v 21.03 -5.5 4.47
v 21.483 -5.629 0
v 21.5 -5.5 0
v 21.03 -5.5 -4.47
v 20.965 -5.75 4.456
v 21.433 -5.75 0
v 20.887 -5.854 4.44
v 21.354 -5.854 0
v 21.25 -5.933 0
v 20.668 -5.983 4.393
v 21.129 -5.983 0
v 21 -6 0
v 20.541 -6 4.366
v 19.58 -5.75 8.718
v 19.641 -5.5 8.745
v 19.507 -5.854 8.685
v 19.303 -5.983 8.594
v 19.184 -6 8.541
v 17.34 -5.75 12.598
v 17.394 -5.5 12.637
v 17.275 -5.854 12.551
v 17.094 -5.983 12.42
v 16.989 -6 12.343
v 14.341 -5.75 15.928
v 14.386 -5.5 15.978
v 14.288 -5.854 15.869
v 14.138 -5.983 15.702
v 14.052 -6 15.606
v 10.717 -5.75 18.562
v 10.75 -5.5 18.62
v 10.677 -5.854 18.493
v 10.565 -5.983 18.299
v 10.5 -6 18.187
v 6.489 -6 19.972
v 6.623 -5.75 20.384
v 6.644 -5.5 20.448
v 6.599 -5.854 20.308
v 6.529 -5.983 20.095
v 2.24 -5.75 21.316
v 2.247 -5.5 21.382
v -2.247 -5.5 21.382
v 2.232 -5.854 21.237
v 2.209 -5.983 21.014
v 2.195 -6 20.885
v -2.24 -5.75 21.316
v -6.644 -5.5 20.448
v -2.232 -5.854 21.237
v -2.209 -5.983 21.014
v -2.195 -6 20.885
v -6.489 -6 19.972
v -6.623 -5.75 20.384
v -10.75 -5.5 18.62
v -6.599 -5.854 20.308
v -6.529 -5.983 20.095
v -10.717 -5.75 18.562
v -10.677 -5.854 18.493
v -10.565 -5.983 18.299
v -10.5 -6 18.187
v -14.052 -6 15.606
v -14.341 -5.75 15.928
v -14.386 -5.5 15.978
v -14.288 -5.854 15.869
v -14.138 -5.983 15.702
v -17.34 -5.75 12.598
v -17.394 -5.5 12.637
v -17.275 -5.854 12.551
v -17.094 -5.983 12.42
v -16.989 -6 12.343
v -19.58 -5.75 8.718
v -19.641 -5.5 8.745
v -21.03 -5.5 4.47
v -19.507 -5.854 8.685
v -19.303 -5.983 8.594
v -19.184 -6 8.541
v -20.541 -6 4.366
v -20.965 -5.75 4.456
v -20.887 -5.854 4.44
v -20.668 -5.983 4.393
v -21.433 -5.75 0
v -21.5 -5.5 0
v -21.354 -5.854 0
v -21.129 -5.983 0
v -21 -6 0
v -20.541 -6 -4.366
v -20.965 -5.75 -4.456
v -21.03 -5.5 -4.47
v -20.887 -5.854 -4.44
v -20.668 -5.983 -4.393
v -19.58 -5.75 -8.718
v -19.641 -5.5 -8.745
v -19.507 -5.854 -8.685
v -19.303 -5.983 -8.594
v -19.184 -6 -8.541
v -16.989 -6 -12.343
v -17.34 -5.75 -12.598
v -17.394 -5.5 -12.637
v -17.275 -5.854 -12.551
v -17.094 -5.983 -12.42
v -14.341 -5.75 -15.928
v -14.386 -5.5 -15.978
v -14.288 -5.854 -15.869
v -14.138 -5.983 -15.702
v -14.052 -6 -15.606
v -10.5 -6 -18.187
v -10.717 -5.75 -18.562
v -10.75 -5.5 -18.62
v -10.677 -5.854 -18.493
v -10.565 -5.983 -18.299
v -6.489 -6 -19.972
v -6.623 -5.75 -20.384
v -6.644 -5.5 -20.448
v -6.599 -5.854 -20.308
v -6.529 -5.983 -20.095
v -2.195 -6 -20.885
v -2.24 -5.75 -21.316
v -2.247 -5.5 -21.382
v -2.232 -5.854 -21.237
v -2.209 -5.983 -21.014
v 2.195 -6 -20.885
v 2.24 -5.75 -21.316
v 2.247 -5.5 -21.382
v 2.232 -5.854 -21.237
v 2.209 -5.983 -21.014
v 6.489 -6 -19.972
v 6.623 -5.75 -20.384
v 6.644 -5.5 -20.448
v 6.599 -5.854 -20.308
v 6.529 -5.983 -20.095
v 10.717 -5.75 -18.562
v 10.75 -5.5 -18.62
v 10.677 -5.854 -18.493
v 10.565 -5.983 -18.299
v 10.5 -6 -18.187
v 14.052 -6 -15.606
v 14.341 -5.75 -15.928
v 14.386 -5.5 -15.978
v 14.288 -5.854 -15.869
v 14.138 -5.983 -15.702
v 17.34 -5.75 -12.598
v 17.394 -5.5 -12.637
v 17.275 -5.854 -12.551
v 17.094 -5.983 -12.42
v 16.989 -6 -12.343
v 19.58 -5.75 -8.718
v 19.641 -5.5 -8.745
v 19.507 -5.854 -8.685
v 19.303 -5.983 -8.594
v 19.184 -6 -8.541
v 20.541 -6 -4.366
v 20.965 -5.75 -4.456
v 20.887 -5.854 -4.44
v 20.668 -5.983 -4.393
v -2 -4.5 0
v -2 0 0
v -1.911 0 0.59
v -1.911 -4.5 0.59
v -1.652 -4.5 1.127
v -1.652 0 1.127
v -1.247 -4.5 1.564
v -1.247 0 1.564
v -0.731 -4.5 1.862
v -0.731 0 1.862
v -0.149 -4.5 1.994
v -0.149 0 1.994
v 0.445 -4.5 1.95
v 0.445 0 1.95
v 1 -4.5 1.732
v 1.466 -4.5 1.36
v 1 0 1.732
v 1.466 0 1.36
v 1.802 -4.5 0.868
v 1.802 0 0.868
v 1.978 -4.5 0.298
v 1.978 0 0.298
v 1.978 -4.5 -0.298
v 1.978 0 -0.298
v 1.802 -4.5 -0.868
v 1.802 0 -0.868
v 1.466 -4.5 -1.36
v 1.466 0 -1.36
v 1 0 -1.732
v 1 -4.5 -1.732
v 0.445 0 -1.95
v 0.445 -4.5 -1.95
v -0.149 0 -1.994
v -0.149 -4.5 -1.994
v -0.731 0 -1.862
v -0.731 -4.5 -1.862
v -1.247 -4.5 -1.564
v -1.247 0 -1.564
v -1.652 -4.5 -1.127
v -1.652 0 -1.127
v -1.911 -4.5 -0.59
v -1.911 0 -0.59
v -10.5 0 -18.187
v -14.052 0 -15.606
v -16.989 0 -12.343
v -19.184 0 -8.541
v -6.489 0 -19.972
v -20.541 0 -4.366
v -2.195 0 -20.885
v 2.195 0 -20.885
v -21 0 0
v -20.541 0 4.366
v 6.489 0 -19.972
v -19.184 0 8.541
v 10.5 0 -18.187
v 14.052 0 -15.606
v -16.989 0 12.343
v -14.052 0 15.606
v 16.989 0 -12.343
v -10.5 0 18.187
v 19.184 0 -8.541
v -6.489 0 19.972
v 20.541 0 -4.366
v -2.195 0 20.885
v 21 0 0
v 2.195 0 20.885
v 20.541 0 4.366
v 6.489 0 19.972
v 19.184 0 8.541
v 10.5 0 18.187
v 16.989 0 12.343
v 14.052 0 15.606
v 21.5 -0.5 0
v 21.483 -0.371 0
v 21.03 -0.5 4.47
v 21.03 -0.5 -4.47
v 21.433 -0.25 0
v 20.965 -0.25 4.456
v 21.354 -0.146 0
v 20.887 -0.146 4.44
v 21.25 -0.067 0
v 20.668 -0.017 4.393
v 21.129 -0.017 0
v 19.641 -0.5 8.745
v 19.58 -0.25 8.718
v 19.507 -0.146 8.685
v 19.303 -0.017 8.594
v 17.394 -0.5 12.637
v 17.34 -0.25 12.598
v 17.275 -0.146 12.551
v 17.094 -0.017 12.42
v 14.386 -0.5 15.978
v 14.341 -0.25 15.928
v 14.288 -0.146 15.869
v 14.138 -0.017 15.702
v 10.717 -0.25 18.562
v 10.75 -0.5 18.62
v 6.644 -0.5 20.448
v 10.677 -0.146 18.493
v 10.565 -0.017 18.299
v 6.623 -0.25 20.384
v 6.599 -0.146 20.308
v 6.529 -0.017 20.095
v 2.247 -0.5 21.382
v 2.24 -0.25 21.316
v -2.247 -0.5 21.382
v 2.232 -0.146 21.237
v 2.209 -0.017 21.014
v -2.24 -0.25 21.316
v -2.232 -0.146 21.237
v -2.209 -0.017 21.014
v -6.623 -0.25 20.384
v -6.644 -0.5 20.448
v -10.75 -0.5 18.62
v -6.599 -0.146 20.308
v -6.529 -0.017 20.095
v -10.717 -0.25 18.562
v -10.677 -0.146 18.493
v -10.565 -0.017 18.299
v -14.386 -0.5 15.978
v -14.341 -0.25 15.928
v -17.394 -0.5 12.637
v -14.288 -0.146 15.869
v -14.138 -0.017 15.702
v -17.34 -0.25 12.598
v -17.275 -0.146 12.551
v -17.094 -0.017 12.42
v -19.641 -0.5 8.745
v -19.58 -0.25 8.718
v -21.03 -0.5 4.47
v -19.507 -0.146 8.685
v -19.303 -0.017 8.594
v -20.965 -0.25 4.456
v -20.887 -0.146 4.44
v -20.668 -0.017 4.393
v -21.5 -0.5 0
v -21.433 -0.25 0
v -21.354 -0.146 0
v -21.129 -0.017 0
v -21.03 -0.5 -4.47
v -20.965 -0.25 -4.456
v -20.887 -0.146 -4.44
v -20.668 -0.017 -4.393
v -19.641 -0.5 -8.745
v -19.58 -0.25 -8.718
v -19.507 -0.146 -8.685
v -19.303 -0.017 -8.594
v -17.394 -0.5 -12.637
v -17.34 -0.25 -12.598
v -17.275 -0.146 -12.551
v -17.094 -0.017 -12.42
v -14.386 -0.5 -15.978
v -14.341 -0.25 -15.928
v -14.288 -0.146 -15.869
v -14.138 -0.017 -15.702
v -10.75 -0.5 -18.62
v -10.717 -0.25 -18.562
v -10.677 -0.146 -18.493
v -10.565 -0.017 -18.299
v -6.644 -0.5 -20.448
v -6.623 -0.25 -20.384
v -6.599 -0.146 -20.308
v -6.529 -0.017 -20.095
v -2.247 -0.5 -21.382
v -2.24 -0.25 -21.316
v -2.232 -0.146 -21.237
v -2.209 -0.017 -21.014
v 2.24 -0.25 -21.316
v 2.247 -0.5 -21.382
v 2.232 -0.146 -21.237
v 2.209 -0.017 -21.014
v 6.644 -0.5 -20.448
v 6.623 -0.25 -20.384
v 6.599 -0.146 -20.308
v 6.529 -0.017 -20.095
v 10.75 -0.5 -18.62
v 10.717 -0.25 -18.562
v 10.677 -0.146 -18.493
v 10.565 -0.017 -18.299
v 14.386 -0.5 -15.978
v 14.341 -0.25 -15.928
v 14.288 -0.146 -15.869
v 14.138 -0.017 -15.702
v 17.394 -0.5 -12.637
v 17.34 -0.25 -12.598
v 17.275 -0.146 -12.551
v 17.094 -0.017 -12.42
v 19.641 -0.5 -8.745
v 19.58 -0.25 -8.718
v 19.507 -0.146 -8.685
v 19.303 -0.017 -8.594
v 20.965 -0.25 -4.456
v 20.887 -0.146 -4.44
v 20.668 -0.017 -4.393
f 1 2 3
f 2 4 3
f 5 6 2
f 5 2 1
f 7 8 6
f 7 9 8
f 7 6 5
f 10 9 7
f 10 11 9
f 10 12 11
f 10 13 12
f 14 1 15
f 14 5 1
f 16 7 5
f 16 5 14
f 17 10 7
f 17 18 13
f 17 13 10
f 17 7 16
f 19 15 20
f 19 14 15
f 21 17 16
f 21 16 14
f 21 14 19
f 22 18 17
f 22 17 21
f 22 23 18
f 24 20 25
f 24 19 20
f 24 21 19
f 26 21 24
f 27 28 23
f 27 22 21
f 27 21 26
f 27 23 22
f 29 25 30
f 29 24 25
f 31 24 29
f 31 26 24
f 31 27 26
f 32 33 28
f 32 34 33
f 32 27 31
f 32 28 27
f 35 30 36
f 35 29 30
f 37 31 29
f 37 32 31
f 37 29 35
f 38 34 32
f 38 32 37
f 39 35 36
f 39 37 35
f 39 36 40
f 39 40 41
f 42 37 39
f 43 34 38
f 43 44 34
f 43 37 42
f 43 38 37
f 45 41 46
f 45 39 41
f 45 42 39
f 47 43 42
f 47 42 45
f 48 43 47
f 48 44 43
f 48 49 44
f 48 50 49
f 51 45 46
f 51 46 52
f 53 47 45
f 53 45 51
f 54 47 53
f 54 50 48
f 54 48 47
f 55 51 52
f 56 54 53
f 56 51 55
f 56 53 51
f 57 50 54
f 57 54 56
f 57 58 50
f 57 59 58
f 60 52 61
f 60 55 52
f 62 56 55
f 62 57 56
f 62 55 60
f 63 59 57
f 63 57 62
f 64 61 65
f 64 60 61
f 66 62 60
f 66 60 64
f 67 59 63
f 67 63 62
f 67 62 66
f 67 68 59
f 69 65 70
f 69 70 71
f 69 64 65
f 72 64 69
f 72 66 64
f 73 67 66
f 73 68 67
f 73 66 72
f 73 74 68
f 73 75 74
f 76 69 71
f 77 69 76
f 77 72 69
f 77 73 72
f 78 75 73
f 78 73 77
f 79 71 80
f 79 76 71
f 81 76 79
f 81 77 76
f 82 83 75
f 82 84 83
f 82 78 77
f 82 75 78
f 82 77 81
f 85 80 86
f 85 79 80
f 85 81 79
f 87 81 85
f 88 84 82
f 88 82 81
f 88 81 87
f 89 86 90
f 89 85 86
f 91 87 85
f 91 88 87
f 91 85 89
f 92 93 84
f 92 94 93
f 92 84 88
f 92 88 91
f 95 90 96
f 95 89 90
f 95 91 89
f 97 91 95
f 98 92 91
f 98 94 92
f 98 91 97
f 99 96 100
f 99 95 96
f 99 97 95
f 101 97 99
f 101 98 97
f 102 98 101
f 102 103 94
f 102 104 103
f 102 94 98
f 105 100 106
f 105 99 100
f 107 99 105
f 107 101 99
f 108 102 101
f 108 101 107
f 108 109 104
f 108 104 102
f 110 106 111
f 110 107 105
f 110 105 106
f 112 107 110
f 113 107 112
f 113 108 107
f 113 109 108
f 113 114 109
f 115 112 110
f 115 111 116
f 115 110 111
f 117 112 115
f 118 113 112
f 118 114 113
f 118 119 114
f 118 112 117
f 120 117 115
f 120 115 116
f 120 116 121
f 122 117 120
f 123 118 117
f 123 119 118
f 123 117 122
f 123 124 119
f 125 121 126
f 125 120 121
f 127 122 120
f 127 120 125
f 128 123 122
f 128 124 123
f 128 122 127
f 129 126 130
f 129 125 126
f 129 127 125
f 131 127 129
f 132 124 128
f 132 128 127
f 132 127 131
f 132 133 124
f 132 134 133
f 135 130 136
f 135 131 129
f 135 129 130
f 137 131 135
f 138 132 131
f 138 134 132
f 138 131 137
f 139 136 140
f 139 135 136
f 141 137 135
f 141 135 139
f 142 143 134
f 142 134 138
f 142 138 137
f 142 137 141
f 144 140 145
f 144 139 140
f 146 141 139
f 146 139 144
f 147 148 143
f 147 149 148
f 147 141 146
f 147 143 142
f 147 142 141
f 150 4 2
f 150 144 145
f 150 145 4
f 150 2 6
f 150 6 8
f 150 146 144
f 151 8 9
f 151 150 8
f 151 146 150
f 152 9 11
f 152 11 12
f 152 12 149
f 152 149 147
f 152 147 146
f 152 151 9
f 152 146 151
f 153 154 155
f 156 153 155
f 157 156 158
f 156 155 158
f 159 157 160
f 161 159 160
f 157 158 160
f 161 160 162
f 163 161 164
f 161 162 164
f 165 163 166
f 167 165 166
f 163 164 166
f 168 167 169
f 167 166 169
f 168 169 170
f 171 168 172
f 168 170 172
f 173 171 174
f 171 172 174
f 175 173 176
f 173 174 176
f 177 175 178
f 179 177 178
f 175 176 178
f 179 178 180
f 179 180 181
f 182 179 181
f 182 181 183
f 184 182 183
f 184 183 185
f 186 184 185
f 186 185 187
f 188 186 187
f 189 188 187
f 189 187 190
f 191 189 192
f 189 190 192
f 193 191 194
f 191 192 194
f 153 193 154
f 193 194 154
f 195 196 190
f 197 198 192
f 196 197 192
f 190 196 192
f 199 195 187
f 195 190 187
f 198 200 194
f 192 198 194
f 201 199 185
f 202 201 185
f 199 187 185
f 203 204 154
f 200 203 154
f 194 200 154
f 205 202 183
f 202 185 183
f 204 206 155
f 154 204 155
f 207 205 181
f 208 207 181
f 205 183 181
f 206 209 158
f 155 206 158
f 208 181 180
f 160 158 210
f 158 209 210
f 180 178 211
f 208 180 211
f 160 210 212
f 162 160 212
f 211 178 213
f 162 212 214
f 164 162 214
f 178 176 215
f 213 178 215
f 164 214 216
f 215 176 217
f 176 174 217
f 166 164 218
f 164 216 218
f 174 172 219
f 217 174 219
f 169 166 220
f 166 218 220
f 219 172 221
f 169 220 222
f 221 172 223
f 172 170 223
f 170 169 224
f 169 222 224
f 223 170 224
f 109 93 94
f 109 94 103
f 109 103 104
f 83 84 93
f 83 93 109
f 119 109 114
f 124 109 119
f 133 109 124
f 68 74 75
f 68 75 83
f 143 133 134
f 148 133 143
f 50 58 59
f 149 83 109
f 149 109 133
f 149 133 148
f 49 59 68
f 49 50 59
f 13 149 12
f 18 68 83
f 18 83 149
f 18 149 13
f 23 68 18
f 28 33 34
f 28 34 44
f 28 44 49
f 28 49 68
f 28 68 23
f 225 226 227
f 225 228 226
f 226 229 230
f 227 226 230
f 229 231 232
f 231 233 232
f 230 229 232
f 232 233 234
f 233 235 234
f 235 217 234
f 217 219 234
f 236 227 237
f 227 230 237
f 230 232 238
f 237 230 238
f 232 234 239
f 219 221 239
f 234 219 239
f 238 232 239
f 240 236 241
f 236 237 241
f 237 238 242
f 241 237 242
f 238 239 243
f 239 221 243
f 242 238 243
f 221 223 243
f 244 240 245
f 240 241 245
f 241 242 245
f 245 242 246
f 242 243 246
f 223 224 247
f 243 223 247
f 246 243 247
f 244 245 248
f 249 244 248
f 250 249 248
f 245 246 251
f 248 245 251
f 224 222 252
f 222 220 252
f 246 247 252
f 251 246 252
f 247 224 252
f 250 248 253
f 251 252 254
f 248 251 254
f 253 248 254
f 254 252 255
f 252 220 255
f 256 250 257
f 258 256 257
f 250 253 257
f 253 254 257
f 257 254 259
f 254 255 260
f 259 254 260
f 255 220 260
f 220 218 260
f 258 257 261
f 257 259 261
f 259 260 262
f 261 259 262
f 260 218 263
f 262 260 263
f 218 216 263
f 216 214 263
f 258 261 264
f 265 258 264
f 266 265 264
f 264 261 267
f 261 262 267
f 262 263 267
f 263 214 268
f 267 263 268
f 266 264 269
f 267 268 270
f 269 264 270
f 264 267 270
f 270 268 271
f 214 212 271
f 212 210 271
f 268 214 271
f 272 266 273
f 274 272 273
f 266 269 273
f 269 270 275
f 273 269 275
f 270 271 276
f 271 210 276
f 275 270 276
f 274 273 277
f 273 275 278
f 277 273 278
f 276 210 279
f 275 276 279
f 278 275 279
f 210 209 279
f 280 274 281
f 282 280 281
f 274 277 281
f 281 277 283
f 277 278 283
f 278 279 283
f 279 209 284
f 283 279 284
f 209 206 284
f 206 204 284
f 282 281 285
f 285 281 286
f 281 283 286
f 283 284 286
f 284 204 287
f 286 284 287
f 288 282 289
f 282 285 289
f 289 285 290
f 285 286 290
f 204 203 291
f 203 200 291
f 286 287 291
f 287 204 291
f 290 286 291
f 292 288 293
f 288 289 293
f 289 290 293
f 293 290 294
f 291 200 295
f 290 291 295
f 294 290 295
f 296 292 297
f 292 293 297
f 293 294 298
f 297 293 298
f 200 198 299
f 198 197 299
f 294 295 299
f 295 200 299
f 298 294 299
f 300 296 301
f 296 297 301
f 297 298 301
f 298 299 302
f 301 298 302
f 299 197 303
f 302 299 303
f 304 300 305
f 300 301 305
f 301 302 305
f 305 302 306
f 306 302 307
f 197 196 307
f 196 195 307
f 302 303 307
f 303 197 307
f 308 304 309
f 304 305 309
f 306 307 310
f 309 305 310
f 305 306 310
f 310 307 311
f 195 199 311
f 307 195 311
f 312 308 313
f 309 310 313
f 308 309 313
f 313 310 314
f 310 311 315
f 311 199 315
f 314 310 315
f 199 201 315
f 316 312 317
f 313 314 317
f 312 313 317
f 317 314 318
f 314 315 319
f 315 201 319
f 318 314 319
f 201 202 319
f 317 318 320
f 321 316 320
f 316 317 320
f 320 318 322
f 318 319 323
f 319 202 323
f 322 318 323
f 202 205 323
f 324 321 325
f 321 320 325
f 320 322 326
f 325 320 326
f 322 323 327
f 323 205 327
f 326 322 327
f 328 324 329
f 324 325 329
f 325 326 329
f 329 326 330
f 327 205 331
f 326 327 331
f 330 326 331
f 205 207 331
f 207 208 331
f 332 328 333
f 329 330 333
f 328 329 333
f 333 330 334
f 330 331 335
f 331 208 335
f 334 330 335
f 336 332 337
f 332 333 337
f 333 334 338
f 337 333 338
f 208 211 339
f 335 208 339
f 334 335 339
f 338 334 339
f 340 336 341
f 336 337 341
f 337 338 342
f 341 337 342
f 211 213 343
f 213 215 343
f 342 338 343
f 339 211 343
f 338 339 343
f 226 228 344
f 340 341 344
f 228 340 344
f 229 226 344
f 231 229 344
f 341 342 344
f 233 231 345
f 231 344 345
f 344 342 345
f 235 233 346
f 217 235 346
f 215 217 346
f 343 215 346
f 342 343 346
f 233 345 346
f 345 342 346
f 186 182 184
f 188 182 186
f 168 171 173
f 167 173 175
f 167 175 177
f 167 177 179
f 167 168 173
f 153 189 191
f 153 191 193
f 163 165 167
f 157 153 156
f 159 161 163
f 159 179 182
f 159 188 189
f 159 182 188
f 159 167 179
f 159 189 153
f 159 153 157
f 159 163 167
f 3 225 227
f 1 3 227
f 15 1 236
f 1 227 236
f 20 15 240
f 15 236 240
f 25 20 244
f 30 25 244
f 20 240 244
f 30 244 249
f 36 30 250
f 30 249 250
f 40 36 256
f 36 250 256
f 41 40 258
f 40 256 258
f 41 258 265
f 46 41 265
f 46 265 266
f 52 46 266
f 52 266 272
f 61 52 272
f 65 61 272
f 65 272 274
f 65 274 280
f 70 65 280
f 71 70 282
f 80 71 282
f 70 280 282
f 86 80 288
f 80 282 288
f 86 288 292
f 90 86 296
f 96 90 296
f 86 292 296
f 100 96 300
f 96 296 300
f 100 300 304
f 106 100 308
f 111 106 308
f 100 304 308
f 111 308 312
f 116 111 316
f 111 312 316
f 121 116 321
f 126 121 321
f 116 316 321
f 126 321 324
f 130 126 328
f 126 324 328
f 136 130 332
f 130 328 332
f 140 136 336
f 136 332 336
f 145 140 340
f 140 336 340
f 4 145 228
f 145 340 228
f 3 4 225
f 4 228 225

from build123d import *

# Parameters (mm, degrees)
F0_R     = 21.5
F1_DEPTH = 6
F2_R     = 2
F3_DEPTH = 4.5
F4_R     = 0.5


with BuildPart() as f1:
    # F0 (on Front) → F1 (new body)
    with BuildSketch(Plane.XZ):
        Circle(F0_R)
    extrude(amount=F1_DEPTH)

    # F2 (on face) → F3 (cut)
    with BuildSketch(Plane(origin=(0, 0, 0), x_dir=(-1, 0, 0), z_dir=(0, 1, 0))):
        Circle(F2_R)
    extrude(amount=-F3_DEPTH, mode=Mode.SUBTRACT)

    # F4
    f4_edges = [f1.edges().sort_by_distance(p)[0] for p in [
        (-21.5, 0, 0),
        (-21.5, -6, 0),
    ]]
    fillet(f4_edges, radius=F4_R)


solid = f1.part
